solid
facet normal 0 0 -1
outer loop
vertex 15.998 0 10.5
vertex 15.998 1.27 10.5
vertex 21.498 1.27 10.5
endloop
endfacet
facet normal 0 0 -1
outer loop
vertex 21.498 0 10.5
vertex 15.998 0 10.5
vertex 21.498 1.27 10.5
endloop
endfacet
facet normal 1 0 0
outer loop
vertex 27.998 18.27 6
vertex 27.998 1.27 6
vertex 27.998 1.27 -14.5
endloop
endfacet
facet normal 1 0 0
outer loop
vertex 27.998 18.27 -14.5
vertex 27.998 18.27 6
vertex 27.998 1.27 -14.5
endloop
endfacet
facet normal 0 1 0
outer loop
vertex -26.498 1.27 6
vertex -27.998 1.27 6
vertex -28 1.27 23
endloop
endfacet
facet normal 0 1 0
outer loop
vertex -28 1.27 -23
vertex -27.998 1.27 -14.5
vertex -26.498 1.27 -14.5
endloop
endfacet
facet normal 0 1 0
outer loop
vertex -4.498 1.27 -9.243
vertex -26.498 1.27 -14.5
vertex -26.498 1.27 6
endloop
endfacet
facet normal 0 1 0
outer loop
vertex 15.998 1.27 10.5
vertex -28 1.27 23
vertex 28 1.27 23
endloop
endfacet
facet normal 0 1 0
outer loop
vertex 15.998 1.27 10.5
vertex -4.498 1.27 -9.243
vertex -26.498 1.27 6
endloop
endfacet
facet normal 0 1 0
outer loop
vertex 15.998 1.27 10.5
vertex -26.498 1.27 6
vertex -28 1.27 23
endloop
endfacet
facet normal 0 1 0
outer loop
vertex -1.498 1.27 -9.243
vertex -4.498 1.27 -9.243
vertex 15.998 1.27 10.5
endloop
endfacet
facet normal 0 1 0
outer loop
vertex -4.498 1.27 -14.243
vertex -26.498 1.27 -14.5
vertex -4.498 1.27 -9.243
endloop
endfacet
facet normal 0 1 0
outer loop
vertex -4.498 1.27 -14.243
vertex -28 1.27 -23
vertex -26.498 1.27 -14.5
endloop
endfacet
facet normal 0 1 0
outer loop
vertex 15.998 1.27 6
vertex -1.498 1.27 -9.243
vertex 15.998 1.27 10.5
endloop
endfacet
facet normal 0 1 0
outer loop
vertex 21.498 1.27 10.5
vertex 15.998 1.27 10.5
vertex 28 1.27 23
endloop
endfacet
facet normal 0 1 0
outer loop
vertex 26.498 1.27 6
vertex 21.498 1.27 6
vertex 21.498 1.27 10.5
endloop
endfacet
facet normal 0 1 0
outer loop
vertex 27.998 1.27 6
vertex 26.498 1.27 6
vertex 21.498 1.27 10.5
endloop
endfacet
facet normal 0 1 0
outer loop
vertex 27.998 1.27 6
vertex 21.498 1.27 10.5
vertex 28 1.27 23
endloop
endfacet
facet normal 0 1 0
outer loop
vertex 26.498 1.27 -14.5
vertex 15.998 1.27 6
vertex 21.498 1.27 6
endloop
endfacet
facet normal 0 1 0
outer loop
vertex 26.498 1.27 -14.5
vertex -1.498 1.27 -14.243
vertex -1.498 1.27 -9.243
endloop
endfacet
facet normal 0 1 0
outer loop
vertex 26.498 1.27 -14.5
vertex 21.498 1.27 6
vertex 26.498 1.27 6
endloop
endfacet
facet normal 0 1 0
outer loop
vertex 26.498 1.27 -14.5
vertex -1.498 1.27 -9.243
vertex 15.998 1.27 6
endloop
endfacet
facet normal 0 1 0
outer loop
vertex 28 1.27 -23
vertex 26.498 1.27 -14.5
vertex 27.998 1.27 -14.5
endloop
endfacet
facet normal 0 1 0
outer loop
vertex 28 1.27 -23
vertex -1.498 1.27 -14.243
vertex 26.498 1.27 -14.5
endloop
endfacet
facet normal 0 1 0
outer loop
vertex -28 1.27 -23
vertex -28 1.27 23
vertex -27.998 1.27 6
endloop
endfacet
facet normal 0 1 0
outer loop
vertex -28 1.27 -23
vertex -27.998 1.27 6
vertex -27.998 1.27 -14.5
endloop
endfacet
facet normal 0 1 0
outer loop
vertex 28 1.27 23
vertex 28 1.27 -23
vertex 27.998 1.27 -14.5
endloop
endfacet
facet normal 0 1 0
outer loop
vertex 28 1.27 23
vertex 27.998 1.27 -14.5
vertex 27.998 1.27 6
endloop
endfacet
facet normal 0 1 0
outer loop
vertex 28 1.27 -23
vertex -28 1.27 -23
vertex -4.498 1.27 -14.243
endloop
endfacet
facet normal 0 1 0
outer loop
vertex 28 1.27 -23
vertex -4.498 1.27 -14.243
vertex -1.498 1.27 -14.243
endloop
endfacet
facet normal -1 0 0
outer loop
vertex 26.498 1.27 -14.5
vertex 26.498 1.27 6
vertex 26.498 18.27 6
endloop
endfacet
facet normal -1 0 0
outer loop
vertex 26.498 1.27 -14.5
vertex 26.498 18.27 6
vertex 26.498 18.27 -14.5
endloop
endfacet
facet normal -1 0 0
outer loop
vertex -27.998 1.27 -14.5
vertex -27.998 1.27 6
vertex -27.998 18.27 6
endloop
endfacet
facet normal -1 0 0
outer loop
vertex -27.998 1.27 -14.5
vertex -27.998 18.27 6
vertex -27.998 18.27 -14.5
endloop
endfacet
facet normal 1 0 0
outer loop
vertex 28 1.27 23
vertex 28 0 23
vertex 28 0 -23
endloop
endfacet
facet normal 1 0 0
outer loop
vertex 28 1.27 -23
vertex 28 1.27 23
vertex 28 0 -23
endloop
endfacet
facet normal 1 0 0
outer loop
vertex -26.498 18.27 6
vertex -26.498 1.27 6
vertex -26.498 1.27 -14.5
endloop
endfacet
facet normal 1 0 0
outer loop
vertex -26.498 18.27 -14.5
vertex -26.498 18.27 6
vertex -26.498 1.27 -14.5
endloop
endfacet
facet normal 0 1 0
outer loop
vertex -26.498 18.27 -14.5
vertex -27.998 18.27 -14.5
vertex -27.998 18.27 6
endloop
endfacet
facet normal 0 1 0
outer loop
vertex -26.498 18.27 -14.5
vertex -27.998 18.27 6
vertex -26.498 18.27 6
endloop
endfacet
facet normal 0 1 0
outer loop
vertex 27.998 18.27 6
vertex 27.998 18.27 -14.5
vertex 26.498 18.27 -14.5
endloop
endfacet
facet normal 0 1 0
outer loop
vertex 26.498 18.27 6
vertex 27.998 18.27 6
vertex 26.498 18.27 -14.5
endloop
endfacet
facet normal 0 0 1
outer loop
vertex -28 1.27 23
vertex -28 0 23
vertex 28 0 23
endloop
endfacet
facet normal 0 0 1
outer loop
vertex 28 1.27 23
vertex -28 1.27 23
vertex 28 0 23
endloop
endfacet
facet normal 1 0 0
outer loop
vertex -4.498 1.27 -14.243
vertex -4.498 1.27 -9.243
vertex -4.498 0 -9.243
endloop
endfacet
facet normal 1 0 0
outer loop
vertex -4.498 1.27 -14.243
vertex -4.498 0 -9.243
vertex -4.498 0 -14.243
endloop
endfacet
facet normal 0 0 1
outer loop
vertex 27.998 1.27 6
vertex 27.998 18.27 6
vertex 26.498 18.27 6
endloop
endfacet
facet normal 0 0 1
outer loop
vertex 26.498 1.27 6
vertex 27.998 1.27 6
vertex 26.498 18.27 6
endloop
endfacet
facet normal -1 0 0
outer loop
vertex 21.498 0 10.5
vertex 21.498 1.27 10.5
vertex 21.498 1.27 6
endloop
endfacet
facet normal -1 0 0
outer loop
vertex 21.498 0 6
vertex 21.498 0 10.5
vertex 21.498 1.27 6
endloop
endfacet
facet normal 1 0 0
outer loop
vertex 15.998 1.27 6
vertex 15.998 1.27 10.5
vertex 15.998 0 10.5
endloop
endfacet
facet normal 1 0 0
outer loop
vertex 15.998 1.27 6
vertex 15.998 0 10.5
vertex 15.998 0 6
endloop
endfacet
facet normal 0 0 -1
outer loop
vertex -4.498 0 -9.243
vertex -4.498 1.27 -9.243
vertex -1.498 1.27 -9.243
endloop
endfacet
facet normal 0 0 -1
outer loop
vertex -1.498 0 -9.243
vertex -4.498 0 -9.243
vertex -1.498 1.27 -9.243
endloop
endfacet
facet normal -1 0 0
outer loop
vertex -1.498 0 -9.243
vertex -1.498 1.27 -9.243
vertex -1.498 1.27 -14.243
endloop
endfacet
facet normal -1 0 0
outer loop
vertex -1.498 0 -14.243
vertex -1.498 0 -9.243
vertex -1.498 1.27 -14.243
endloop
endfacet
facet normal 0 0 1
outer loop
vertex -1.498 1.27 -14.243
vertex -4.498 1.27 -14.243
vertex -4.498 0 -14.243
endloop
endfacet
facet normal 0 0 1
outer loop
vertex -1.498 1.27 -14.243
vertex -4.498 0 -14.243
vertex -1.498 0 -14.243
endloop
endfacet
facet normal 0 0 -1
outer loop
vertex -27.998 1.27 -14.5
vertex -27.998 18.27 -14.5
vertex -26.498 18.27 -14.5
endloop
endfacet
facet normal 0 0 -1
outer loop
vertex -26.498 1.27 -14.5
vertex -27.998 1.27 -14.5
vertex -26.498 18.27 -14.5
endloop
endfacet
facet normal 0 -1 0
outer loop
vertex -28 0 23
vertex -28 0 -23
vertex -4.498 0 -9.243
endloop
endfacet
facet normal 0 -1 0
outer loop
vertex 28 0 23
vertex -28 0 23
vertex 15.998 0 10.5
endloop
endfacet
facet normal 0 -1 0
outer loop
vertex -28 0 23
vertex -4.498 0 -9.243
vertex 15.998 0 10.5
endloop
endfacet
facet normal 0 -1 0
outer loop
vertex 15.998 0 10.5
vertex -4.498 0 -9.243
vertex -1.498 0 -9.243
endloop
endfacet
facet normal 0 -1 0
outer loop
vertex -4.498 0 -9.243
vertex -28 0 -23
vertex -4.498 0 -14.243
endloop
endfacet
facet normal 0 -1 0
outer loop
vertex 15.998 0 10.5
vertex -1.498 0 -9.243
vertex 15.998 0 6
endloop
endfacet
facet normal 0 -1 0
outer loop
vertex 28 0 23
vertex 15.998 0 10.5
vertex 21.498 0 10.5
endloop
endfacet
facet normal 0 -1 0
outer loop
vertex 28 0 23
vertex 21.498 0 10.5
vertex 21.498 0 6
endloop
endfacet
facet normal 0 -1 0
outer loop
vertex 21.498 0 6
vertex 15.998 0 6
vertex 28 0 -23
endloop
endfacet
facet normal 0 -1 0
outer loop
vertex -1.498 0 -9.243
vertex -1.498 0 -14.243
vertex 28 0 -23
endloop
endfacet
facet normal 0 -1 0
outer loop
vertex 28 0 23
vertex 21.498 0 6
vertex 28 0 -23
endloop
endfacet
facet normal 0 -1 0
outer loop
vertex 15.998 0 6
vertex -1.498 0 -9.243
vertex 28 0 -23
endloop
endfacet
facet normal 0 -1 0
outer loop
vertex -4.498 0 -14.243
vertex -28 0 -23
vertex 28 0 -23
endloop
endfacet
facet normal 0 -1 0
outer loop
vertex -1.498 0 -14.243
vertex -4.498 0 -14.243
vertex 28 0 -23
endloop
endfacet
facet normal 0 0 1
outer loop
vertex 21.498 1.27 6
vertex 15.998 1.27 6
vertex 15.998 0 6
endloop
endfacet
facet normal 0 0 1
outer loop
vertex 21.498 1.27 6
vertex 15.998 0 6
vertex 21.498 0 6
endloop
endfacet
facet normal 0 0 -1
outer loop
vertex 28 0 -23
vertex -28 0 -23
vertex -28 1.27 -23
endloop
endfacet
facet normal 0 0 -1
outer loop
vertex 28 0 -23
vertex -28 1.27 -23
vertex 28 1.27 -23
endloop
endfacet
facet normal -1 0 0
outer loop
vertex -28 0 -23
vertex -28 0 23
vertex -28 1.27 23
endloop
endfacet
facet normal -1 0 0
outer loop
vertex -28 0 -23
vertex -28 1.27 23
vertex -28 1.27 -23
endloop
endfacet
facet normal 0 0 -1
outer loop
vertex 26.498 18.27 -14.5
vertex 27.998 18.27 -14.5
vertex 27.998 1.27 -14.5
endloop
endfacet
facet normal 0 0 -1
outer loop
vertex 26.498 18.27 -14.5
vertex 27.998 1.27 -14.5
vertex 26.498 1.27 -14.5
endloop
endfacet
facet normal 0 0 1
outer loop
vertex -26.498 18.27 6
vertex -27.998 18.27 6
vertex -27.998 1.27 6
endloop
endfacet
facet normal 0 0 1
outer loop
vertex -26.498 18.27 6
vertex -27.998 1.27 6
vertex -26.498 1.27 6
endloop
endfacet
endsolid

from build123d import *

# Parameters (mm, degrees)
SKETCH1_W           = 56
SKETCH1_H           = 46
BOSS_EXTRUDE1_DEPTH = 1.27
SKETCH2_W           = 1.5
SKETCH2_H           = 20.5
BOSS_EXTRUDE2_DEPTH = 17
SKETCH3_W           = 3
SKETCH3_H           = 5
CUT_EXTRUDE1_DEPTH  = 17
SKETCH4_W           = 5.5
SKETCH4_H           = 4.5
CUT_EXTRUDE2_DEPTH  = 17


with BuildPart() as part:
    # Sketch1 → Boss-Extrude1 (new body)
    with BuildSketch(Plane(origin=(0, 0, 0), x_dir=(1, 0, 0), z_dir=(0, 1, 0))):
        Rectangle(SKETCH1_W, SKETCH1_H)
    extrude(amount=BOSS_EXTRUDE1_DEPTH)

    # Sketch2 → Boss-Extrude2 (add)
    with BuildSketch(Plane(origin=(0, 1.27, 0), x_dir=(1, 0, 0), z_dir=(0, 1, 0))):
        with Locations((-27.248, 4.25)):
            Rectangle(SKETCH2_W, SKETCH2_H)
    boss_extrude2 = extrude(amount=BOSS_EXTRUDE2_DEPTH)

    # Mirror2: Boss-Extrude2 across plane
    add(boss_extrude2.mirror(Plane(origin=(0, 0, 0), x_dir=(0, 0, 1), z_dir=(1, 0, 0))))

    # Sketch3 → Cut-Extrude1 (cut)
    with BuildSketch(Plane(origin=(0, 1.27, 0), x_dir=(1, 0, 0), z_dir=(0, 1, 0))):
        with Locations((-2.998, 11.743007137)):
            Rectangle(SKETCH3_W, SKETCH3_H)
    extrude(amount=-CUT_EXTRUDE1_DEPTH, mode=Mode.SUBTRACT)

    # Sketch4 → Cut-Extrude2 (cut)
    with BuildSketch(Plane(origin=(0, 1.27, 0), x_dir=(1, 0, 0), z_dir=(0, 1, 0))):
        with Locations((18.748, -8.25)):
            Rectangle(SKETCH4_W, SKETCH4_H)
    extrude(amount=-CUT_EXTRUDE2_DEPTH, mode=Mode.SUBTRACT)


solid = part.part
